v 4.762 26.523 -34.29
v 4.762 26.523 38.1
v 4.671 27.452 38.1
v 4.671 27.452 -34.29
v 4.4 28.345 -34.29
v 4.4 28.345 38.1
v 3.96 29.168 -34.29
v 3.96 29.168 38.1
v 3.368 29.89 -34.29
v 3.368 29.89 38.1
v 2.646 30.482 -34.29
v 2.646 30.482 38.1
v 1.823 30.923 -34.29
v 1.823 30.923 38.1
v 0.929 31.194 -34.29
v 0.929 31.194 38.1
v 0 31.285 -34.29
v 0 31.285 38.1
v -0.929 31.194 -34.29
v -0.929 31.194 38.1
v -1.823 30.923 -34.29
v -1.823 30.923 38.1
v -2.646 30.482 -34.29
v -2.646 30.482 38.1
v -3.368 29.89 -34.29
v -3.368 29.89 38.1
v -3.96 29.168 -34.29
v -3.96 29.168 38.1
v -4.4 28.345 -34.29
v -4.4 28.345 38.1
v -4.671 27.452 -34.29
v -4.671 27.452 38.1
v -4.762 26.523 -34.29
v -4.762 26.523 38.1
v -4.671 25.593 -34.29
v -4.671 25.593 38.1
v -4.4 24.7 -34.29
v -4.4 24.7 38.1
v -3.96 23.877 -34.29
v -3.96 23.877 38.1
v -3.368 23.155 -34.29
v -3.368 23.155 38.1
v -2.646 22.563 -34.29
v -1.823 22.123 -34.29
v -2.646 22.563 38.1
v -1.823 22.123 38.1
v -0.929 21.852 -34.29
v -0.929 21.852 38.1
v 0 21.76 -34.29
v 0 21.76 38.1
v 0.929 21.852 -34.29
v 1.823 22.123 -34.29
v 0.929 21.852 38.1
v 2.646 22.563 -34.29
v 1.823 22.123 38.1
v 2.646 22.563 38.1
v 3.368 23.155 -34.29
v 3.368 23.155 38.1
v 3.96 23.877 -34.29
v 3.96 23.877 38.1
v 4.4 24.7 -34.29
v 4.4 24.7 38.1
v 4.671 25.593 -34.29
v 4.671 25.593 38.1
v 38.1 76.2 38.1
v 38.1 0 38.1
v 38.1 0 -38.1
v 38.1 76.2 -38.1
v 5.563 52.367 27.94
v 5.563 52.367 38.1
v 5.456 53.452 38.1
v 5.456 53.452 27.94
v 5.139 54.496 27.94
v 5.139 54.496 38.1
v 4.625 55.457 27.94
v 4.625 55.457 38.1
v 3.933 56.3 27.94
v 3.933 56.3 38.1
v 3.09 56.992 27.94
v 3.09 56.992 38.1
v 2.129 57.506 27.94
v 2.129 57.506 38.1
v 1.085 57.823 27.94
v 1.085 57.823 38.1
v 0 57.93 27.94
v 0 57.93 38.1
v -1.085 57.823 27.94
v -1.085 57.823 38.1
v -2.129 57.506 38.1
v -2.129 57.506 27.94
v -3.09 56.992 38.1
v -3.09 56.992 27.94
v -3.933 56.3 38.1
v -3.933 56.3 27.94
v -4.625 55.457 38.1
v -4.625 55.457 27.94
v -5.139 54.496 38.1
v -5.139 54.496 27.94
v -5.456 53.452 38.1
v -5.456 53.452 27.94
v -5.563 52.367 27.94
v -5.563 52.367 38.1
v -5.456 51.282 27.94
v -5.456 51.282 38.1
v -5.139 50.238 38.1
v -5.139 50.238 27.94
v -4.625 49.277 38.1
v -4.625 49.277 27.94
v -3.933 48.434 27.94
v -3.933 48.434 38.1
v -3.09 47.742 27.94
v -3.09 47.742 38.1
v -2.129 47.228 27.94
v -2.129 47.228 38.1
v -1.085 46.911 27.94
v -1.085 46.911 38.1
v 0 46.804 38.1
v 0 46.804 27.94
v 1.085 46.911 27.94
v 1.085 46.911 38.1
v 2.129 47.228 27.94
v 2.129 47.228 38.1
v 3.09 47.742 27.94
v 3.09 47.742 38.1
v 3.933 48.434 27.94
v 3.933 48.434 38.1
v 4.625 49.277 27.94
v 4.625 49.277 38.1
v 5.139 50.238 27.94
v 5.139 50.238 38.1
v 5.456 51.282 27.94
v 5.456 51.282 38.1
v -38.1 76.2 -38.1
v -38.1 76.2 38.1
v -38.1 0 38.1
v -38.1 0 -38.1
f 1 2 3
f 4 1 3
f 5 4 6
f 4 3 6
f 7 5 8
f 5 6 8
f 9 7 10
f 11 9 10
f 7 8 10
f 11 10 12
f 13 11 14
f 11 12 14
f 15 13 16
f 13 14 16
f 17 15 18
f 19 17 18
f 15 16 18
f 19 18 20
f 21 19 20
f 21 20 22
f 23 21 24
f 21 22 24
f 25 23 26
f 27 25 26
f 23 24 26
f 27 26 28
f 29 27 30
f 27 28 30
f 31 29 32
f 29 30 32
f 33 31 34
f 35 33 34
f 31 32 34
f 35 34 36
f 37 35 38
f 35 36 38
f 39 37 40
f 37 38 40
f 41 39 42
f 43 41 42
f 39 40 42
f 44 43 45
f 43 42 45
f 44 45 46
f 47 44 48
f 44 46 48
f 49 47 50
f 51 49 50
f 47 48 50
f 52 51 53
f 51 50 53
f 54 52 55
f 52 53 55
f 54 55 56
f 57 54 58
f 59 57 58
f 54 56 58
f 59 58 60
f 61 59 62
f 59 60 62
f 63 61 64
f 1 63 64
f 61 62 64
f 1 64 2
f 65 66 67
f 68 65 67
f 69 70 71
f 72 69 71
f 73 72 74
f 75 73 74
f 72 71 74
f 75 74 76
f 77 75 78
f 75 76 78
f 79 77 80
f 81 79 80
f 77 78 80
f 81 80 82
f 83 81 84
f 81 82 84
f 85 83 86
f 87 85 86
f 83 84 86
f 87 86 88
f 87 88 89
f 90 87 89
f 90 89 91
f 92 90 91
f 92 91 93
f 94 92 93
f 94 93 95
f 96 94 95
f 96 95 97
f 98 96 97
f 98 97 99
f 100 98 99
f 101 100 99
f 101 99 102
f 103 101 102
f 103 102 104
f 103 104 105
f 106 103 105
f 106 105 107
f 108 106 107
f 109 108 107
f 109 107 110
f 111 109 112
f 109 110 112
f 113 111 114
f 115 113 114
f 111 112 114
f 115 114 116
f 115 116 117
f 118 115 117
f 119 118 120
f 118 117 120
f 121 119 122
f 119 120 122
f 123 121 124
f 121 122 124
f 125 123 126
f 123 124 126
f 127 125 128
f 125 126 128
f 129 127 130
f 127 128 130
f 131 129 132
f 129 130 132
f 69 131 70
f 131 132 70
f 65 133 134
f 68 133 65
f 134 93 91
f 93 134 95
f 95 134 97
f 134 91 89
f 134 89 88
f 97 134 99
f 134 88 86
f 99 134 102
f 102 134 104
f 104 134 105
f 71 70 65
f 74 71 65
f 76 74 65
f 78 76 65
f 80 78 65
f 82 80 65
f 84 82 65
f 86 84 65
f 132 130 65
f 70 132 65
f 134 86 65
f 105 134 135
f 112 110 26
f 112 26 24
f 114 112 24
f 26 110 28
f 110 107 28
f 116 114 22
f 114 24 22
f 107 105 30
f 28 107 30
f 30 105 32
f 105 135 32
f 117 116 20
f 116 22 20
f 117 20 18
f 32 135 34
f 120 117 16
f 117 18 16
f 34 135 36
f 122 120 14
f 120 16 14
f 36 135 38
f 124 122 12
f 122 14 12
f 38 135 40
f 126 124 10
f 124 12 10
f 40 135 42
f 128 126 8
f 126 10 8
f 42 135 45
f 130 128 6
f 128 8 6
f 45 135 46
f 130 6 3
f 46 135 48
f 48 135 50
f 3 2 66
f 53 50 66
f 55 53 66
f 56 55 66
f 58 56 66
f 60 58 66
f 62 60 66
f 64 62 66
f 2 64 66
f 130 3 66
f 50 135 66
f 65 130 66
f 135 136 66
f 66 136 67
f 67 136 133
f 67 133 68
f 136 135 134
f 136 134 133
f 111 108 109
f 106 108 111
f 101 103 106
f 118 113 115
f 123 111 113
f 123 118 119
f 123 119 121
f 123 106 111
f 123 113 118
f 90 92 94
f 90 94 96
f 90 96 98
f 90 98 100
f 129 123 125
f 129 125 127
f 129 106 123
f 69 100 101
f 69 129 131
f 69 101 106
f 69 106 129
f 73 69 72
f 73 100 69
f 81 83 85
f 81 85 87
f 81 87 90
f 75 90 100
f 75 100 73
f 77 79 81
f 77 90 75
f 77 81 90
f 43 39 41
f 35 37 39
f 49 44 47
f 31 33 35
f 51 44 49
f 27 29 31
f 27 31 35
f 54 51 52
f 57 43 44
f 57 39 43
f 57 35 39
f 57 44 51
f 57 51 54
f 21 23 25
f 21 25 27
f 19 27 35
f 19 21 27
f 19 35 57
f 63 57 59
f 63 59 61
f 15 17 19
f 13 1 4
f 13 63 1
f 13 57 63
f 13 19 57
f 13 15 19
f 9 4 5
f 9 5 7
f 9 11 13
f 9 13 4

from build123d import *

# Parameters (mm, degrees)
SKETCH2_W           = 76.2
SKETCH2_H           = 76.2
BOSS_EXTRUDE1_DEPTH = 76.2
SKETCH3_R           = 4.7625
SKETCH3_R_2         = 5.5626
CUT_EXTRUDE1_DEPTH  = 72.39
SKETCH5_R           = 5.5626
BOSS_EXTRUDE2_DEPTH = 62.23


with BuildPart() as part:
    # Sketch2 → Boss-Extrude1 (new body)
    with BuildSketch(Plane(origin=(0, 0, 0), x_dir=(1, 0, 0), z_dir=(0, 1, 0))):
        Rectangle(SKETCH2_W, SKETCH2_H)
    extrude(amount=BOSS_EXTRUDE1_DEPTH)

    # Sketch3 → Cut-Extrude1 (cut)
    with BuildSketch(Plane.XY.offset(38.1)):
        with Locations((0, 26.522528218)):
            Circle(SKETCH3_R)
        with Locations((0, 52.367028218)):
            Circle(SKETCH3_R_2)
    extrude(amount=-CUT_EXTRUDE1_DEPTH, mode=Mode.SUBTRACT)

    # Sketch5 → Boss-Extrude2 (add)
    with BuildSketch(Plane.XY.offset(-34.29)):
        with Locations((0, 52.367028218)):
            Circle(SKETCH5_R)
    extrude(amount=BOSS_EXTRUDE2_DEPTH)


solid = part.part
